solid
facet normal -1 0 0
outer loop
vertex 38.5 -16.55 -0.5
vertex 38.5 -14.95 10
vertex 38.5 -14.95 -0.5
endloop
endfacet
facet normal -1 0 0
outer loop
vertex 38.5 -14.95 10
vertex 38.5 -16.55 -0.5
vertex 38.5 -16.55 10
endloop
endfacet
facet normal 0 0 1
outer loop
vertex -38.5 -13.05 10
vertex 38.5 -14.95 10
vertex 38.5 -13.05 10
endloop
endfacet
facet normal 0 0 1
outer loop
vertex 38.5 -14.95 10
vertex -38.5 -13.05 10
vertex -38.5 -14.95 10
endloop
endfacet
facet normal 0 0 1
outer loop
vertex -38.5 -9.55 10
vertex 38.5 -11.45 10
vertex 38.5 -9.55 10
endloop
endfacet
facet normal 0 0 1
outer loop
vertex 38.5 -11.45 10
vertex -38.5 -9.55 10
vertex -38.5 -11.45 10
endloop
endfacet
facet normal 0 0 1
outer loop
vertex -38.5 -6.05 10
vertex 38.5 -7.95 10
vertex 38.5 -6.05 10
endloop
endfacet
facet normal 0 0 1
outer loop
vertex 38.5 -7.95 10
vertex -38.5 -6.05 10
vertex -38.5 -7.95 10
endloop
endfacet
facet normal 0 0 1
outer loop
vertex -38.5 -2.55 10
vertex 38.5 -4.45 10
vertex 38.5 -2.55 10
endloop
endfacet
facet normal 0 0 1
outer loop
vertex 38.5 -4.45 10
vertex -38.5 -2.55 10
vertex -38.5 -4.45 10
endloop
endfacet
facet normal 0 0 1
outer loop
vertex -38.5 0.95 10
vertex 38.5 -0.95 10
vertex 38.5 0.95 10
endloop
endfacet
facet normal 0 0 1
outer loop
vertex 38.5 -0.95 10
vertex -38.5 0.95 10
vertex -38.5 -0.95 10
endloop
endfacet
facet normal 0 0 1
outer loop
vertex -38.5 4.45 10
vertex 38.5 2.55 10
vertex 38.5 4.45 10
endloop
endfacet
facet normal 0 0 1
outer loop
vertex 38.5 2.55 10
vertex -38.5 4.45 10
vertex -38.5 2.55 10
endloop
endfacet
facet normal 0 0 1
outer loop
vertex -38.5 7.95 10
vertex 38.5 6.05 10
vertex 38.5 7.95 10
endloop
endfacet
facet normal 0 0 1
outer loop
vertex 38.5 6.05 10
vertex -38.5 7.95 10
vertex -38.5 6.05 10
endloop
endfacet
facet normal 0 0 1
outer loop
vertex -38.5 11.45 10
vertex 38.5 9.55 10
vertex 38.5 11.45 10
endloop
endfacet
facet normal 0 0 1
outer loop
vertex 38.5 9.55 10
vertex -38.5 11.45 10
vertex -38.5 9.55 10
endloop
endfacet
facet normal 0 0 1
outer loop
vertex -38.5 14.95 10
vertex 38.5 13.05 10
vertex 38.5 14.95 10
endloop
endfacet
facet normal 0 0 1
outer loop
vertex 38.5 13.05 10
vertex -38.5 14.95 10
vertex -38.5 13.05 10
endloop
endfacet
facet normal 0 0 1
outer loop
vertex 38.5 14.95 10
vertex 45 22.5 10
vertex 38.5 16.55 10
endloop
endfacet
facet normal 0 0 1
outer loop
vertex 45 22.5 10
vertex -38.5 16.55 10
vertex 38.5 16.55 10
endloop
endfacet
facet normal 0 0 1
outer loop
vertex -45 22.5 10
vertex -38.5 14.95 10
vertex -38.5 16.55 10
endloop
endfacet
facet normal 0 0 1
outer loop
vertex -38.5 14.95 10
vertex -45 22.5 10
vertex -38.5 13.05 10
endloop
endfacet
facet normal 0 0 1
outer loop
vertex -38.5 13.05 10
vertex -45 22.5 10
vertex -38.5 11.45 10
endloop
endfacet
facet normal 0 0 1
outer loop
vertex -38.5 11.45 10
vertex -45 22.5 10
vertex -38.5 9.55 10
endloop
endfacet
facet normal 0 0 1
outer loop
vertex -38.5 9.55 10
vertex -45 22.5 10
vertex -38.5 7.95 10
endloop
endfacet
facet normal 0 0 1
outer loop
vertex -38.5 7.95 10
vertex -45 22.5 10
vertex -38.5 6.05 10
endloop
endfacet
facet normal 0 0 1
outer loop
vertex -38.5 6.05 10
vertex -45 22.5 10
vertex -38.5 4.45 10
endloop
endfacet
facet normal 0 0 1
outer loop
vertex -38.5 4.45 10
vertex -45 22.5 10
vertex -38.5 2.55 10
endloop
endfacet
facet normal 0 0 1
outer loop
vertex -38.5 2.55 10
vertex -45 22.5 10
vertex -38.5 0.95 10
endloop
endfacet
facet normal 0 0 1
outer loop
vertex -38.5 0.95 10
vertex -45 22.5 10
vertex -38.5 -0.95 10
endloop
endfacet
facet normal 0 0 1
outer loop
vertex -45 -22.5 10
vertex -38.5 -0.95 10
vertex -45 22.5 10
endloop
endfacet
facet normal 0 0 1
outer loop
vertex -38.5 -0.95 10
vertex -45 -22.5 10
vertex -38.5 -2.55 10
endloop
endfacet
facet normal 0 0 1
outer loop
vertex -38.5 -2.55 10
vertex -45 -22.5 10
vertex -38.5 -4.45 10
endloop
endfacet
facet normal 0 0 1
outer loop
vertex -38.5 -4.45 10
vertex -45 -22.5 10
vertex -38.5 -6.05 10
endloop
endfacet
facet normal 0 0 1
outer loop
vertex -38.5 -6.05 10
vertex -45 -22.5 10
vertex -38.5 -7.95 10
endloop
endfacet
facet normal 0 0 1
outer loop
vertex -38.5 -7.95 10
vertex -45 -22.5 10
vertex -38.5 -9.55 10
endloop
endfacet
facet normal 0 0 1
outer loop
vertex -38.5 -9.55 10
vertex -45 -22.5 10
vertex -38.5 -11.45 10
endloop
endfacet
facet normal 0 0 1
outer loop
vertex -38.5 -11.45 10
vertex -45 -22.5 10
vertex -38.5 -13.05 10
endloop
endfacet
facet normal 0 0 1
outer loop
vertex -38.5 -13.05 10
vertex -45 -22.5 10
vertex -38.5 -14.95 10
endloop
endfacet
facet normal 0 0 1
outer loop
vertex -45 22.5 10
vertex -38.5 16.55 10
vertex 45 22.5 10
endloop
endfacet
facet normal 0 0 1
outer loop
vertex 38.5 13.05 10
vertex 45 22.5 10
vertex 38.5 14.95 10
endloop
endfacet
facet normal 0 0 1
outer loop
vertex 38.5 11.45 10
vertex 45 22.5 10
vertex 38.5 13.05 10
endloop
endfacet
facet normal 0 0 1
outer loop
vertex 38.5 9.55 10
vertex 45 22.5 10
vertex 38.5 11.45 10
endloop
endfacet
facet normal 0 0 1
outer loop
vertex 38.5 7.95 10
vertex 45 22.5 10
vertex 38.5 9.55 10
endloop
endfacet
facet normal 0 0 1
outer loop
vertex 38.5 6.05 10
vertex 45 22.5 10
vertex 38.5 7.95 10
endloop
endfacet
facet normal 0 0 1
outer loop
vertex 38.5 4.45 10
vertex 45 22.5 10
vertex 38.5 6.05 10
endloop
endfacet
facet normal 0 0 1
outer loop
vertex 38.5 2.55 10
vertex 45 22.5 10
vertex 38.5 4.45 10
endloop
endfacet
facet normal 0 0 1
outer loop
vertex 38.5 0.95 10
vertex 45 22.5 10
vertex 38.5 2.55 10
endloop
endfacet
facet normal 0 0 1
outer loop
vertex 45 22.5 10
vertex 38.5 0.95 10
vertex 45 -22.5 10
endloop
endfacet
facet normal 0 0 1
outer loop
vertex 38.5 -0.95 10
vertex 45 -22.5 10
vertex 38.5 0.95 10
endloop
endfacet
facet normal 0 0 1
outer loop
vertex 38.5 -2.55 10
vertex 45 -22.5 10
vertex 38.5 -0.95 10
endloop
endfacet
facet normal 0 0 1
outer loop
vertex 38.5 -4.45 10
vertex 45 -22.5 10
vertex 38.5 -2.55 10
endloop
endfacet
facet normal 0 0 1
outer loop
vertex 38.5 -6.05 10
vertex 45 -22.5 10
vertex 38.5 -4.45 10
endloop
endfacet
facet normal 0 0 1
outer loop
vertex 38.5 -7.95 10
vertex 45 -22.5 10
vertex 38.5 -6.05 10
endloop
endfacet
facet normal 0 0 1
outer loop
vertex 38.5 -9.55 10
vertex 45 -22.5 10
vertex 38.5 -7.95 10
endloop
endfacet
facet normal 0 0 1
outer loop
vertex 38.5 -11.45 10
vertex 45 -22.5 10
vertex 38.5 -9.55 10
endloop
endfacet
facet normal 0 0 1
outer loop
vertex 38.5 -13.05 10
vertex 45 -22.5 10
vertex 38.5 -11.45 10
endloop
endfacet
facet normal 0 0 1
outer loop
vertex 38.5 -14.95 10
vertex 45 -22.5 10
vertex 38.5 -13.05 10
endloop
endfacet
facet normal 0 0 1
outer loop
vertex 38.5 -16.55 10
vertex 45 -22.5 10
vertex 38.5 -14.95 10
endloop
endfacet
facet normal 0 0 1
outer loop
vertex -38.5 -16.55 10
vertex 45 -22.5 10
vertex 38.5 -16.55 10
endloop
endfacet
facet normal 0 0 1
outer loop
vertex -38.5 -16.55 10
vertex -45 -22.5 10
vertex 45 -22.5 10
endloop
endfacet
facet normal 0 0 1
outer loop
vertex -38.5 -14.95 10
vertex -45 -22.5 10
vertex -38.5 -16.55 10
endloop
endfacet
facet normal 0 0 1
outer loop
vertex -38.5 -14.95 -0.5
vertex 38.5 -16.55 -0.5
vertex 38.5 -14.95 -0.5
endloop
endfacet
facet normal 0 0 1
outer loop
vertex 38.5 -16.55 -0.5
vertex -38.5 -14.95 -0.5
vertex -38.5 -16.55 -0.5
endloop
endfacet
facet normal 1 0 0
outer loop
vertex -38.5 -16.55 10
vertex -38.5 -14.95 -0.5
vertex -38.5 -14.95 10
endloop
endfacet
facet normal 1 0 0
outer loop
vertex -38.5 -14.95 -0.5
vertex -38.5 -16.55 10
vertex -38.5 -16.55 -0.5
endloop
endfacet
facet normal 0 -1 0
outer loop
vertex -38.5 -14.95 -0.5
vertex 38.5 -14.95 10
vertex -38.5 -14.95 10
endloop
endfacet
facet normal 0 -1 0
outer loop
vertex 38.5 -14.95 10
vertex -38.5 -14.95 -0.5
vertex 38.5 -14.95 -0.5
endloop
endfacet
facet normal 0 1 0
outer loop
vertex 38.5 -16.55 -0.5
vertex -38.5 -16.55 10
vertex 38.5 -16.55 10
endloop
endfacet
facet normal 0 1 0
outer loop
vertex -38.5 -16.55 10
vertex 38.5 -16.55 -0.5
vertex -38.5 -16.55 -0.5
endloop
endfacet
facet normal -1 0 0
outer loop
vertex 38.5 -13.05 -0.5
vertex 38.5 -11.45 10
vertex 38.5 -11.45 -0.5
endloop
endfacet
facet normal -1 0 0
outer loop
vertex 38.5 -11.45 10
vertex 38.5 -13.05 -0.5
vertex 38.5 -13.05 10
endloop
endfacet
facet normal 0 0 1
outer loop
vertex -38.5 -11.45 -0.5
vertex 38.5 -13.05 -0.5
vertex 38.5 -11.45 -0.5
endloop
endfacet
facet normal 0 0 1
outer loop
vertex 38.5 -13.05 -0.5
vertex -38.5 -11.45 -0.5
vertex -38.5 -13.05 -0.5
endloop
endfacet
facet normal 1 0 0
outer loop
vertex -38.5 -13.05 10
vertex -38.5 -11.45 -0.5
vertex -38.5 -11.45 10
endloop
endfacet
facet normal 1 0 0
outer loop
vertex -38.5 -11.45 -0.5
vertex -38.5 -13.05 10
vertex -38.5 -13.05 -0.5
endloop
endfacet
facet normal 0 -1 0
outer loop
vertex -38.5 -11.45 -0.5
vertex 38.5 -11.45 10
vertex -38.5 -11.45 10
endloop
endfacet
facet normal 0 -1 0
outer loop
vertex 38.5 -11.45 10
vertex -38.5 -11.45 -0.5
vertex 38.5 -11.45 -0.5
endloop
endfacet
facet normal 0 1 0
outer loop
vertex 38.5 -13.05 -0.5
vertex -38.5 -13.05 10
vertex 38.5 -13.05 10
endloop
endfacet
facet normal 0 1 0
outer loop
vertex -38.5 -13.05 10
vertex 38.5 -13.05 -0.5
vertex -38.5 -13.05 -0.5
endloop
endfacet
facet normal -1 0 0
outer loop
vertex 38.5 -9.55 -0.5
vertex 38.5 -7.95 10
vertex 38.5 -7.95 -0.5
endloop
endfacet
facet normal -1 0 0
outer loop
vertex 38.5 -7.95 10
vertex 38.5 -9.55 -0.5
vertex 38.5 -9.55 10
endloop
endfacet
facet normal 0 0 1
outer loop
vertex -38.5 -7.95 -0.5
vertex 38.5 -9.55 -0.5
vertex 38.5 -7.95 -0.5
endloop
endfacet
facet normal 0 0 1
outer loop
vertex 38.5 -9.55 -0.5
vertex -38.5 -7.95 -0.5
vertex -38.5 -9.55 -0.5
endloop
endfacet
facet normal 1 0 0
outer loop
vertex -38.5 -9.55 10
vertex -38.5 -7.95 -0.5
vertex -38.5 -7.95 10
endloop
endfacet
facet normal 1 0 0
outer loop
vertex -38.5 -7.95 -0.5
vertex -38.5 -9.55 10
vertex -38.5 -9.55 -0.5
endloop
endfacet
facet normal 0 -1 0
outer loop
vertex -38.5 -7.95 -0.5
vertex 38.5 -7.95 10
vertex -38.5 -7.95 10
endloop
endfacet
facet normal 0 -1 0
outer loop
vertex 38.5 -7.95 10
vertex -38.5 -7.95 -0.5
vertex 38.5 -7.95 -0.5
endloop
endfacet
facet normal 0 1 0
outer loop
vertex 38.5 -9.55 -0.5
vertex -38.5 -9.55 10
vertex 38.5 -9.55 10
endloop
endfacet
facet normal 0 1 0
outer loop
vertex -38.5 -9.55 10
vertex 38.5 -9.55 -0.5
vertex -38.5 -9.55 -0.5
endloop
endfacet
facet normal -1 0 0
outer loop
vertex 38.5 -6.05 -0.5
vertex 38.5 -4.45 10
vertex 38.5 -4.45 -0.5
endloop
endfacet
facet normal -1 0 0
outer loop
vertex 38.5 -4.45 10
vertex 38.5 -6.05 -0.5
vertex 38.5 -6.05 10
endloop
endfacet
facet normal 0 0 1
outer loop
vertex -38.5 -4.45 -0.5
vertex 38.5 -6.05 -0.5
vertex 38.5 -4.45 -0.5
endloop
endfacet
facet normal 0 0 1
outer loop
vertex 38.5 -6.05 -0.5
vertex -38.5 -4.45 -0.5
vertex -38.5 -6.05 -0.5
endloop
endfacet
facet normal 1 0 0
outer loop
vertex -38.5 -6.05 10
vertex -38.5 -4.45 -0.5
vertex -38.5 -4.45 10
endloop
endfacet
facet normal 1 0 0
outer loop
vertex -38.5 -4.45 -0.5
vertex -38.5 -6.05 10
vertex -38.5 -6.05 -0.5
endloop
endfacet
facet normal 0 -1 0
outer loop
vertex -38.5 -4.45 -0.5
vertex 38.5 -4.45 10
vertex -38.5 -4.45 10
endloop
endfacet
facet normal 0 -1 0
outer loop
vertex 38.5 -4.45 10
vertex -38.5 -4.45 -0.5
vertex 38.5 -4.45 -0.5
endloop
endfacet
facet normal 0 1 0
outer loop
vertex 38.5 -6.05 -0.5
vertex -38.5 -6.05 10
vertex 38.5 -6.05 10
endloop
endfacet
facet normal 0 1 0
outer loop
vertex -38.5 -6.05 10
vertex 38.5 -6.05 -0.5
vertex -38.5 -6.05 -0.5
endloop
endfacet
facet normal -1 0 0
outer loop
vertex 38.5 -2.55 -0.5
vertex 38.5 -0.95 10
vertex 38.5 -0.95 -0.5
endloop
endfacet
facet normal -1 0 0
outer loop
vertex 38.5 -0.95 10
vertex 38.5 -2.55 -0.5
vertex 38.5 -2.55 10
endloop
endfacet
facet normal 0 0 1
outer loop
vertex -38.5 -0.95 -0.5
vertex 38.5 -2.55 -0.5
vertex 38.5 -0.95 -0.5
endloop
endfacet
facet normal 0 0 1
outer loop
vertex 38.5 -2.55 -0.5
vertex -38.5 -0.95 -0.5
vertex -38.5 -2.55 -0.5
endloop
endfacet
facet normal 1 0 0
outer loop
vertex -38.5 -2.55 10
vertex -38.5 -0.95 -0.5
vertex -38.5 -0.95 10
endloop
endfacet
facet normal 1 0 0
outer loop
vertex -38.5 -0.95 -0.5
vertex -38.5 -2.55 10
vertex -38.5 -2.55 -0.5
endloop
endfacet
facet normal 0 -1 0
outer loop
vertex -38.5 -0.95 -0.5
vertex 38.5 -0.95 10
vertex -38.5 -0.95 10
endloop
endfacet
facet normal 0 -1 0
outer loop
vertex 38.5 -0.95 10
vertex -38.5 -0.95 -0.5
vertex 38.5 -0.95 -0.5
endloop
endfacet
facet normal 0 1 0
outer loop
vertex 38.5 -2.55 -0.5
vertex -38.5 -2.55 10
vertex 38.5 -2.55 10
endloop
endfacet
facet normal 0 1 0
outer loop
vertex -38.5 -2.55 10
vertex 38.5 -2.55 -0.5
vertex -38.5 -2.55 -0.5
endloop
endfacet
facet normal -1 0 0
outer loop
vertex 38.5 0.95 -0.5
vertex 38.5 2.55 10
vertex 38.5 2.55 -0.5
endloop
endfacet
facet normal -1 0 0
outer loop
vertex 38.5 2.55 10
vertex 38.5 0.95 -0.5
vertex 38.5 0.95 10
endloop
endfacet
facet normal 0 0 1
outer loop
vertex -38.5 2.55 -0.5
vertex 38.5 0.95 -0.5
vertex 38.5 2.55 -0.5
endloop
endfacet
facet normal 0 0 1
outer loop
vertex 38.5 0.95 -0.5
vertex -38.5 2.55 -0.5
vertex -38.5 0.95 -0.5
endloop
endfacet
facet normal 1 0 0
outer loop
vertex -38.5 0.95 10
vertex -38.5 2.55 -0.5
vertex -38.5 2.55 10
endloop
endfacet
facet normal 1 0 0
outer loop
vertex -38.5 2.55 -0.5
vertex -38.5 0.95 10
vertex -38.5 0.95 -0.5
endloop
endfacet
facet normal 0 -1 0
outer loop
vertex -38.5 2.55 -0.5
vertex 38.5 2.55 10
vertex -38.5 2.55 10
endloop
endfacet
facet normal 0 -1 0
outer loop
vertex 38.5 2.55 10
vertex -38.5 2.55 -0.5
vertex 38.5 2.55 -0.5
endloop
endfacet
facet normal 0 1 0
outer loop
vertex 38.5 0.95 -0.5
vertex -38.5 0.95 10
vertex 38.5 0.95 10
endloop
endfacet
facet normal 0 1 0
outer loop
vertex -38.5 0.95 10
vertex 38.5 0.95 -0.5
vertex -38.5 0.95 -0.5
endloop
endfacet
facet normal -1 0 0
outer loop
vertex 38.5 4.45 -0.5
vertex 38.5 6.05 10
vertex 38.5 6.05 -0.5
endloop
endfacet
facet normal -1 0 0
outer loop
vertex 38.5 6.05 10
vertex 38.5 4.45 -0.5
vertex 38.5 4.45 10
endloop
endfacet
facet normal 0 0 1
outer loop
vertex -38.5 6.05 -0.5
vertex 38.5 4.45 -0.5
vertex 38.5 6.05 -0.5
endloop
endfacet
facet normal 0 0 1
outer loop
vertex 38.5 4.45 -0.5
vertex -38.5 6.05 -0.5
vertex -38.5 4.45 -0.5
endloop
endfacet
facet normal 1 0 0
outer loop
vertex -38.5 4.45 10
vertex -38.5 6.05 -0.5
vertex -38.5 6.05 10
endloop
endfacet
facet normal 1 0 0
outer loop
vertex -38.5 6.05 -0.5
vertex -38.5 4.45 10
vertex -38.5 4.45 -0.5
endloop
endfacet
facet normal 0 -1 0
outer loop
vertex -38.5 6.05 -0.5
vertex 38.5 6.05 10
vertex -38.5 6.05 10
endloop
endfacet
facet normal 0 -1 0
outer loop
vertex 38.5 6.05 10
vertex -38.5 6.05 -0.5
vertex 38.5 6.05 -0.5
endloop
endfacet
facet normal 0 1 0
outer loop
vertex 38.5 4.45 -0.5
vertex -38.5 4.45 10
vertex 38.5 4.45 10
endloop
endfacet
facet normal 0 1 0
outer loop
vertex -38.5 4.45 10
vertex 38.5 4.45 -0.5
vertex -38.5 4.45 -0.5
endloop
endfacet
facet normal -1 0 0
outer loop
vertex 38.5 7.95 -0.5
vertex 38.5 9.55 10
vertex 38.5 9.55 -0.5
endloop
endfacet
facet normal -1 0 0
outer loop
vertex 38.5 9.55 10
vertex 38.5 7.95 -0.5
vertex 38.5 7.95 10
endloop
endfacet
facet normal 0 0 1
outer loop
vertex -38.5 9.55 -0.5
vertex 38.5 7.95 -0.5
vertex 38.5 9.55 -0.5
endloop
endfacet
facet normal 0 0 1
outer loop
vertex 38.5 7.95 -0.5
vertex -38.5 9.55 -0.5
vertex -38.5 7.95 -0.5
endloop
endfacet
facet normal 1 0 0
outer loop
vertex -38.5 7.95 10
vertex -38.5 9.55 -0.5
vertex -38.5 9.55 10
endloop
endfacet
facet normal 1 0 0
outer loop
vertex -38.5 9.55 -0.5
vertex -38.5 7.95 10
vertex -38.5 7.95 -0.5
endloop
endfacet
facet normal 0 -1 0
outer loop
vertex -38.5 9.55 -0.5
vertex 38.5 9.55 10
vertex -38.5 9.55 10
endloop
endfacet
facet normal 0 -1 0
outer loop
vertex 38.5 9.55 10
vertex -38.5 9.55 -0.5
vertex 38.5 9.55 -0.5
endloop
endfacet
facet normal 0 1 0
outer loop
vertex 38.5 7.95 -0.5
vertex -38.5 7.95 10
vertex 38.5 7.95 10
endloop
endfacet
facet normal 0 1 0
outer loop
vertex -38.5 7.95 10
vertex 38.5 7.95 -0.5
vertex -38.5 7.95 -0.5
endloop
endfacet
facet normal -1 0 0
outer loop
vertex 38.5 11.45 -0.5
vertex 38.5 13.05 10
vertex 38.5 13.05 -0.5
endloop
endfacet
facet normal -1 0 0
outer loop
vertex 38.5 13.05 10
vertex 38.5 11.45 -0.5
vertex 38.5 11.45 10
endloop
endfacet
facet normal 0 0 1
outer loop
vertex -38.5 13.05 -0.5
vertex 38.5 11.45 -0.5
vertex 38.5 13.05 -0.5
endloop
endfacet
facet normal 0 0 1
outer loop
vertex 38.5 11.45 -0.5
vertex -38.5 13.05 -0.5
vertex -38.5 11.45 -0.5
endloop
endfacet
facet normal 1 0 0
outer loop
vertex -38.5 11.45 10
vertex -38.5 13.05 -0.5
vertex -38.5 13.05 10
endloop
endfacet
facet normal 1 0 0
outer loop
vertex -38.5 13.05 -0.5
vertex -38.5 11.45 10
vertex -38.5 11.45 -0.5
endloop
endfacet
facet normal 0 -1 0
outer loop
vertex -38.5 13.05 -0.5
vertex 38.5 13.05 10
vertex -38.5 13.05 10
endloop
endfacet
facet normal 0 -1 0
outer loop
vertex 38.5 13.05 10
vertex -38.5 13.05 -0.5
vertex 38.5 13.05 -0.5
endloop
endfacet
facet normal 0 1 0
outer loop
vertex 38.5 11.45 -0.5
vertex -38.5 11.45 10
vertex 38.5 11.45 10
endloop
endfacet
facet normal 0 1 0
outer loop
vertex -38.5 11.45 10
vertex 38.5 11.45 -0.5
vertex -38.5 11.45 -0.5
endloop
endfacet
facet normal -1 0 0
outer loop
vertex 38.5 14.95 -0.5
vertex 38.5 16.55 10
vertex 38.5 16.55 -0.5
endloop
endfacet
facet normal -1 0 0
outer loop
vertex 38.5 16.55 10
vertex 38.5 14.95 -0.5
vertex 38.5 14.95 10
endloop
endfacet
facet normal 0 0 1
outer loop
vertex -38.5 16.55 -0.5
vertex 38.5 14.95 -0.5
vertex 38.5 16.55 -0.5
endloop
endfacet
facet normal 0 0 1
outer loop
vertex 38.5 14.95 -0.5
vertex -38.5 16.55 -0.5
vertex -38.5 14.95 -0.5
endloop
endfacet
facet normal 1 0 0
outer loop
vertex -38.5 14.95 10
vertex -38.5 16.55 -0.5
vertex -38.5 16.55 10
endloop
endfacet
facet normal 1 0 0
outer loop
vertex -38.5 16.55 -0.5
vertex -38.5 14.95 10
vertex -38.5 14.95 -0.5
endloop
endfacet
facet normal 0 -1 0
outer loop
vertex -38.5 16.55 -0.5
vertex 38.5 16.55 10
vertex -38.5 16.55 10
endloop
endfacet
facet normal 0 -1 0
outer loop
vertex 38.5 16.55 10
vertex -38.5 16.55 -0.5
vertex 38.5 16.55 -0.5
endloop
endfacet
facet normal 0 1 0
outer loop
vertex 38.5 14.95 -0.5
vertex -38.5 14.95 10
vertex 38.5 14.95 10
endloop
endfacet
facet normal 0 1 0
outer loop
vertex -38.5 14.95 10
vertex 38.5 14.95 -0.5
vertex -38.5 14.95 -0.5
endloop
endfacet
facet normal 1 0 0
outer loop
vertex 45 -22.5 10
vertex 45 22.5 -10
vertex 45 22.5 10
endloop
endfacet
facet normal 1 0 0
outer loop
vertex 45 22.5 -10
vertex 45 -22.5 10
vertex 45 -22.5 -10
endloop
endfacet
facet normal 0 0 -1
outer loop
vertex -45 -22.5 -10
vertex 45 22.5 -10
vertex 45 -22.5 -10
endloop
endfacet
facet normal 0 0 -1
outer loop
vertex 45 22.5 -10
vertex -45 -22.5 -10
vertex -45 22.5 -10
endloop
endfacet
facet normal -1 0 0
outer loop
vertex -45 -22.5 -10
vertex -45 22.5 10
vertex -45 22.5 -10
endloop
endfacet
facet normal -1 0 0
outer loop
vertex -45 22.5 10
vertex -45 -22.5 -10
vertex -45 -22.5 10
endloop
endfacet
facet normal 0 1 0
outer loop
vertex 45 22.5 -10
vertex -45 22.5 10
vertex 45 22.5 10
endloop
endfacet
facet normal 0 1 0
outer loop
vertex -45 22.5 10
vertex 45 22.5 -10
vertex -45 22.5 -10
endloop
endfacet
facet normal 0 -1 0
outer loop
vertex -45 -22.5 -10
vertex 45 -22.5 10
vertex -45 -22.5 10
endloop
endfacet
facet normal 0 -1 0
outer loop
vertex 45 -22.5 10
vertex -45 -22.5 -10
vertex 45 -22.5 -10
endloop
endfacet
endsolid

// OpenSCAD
// Drying Rack for 10 Microscope Slides
// Base: 90 x 45 x 20 mm
// Slots: 10 parallel slots along X, 77mm long, 1.6mm wide, 10mm deep
// Spacing: 3.5mm centre-to-centre in Y

$fn = 128;

// Base Dimensions
base_length = 90;
base_width = 45;
base_height = 20;

// Slide Dimensions (for reference)
slide_length = 75;
slide_width = 25;
slide_thickness = 1;

// Slot Dimensions
num_slots = 10;
slot_length = 77;
slot_width = 1.6;
slot_depth = 10;
slot_spacing = 3.5; // Centre-to-centre in Y

// Build Base
difference() {
    // Main Block
    cube([base_length, base_width, base_height], center = true);
    
    // Cut Slots
    // We need to cut 10 slots.
    // Each slot is a rectangular prism: length x width x depth.
    // Orientation: Length along X, Width along Y, Depth along Z (cutting down).
    // Position: Centered in X, Y positions calculated above.
    // Z position: Top of block is at Z=10 (since height is 20 and centered at 0).
    // Slot depth is 10mm, so it goes from Z=10 down to Z=0.
    // To ensure clean cut, we extend slightly past the bottom face (Z=0).
    
    for (i = [0 : num_slots - 1]) {
        // Calculate Y position for this slot
        // Centers are spaced by slot_spacing.
        // The sequence of centers relative to the group center (0) is:
        // -(n-1)/2 * spacing, ..., +(n-1)/2 * spacing
        y_offset = ((i - (num_slots - 1) / 2) * slot_spacing);
        
        // Define the cutting block
        // Dimensions: [slot_length, slot_width, slot_depth + clearance]
        // Clearance ensures the cut goes slightly past the bottom face.
        cut_height = slot_depth + 0.5; 
        
        // Calculate Z position for the cutting block center
        // Top of block is at Z = base_height / 2 = 10.
        // We want the cutting block to extend from Z=10 down to Z=0.5 (slightly past 0).
        // The center of the cutting block should be at: 10 - (cut_height / 2)
        z_center = (base_height / 2) - (cut_height / 2);
        
        translate([
            0, // X is centered
            y_offset, // Y offset calculated above
            z_center // Z center calculated above
        ]) {
            // Draw the cutting block centered at the origin relative to this translate
            // Dimensions: length x width x height
            cube([slot_length, slot_width, cut_height], center = true);
        }
    }
}
